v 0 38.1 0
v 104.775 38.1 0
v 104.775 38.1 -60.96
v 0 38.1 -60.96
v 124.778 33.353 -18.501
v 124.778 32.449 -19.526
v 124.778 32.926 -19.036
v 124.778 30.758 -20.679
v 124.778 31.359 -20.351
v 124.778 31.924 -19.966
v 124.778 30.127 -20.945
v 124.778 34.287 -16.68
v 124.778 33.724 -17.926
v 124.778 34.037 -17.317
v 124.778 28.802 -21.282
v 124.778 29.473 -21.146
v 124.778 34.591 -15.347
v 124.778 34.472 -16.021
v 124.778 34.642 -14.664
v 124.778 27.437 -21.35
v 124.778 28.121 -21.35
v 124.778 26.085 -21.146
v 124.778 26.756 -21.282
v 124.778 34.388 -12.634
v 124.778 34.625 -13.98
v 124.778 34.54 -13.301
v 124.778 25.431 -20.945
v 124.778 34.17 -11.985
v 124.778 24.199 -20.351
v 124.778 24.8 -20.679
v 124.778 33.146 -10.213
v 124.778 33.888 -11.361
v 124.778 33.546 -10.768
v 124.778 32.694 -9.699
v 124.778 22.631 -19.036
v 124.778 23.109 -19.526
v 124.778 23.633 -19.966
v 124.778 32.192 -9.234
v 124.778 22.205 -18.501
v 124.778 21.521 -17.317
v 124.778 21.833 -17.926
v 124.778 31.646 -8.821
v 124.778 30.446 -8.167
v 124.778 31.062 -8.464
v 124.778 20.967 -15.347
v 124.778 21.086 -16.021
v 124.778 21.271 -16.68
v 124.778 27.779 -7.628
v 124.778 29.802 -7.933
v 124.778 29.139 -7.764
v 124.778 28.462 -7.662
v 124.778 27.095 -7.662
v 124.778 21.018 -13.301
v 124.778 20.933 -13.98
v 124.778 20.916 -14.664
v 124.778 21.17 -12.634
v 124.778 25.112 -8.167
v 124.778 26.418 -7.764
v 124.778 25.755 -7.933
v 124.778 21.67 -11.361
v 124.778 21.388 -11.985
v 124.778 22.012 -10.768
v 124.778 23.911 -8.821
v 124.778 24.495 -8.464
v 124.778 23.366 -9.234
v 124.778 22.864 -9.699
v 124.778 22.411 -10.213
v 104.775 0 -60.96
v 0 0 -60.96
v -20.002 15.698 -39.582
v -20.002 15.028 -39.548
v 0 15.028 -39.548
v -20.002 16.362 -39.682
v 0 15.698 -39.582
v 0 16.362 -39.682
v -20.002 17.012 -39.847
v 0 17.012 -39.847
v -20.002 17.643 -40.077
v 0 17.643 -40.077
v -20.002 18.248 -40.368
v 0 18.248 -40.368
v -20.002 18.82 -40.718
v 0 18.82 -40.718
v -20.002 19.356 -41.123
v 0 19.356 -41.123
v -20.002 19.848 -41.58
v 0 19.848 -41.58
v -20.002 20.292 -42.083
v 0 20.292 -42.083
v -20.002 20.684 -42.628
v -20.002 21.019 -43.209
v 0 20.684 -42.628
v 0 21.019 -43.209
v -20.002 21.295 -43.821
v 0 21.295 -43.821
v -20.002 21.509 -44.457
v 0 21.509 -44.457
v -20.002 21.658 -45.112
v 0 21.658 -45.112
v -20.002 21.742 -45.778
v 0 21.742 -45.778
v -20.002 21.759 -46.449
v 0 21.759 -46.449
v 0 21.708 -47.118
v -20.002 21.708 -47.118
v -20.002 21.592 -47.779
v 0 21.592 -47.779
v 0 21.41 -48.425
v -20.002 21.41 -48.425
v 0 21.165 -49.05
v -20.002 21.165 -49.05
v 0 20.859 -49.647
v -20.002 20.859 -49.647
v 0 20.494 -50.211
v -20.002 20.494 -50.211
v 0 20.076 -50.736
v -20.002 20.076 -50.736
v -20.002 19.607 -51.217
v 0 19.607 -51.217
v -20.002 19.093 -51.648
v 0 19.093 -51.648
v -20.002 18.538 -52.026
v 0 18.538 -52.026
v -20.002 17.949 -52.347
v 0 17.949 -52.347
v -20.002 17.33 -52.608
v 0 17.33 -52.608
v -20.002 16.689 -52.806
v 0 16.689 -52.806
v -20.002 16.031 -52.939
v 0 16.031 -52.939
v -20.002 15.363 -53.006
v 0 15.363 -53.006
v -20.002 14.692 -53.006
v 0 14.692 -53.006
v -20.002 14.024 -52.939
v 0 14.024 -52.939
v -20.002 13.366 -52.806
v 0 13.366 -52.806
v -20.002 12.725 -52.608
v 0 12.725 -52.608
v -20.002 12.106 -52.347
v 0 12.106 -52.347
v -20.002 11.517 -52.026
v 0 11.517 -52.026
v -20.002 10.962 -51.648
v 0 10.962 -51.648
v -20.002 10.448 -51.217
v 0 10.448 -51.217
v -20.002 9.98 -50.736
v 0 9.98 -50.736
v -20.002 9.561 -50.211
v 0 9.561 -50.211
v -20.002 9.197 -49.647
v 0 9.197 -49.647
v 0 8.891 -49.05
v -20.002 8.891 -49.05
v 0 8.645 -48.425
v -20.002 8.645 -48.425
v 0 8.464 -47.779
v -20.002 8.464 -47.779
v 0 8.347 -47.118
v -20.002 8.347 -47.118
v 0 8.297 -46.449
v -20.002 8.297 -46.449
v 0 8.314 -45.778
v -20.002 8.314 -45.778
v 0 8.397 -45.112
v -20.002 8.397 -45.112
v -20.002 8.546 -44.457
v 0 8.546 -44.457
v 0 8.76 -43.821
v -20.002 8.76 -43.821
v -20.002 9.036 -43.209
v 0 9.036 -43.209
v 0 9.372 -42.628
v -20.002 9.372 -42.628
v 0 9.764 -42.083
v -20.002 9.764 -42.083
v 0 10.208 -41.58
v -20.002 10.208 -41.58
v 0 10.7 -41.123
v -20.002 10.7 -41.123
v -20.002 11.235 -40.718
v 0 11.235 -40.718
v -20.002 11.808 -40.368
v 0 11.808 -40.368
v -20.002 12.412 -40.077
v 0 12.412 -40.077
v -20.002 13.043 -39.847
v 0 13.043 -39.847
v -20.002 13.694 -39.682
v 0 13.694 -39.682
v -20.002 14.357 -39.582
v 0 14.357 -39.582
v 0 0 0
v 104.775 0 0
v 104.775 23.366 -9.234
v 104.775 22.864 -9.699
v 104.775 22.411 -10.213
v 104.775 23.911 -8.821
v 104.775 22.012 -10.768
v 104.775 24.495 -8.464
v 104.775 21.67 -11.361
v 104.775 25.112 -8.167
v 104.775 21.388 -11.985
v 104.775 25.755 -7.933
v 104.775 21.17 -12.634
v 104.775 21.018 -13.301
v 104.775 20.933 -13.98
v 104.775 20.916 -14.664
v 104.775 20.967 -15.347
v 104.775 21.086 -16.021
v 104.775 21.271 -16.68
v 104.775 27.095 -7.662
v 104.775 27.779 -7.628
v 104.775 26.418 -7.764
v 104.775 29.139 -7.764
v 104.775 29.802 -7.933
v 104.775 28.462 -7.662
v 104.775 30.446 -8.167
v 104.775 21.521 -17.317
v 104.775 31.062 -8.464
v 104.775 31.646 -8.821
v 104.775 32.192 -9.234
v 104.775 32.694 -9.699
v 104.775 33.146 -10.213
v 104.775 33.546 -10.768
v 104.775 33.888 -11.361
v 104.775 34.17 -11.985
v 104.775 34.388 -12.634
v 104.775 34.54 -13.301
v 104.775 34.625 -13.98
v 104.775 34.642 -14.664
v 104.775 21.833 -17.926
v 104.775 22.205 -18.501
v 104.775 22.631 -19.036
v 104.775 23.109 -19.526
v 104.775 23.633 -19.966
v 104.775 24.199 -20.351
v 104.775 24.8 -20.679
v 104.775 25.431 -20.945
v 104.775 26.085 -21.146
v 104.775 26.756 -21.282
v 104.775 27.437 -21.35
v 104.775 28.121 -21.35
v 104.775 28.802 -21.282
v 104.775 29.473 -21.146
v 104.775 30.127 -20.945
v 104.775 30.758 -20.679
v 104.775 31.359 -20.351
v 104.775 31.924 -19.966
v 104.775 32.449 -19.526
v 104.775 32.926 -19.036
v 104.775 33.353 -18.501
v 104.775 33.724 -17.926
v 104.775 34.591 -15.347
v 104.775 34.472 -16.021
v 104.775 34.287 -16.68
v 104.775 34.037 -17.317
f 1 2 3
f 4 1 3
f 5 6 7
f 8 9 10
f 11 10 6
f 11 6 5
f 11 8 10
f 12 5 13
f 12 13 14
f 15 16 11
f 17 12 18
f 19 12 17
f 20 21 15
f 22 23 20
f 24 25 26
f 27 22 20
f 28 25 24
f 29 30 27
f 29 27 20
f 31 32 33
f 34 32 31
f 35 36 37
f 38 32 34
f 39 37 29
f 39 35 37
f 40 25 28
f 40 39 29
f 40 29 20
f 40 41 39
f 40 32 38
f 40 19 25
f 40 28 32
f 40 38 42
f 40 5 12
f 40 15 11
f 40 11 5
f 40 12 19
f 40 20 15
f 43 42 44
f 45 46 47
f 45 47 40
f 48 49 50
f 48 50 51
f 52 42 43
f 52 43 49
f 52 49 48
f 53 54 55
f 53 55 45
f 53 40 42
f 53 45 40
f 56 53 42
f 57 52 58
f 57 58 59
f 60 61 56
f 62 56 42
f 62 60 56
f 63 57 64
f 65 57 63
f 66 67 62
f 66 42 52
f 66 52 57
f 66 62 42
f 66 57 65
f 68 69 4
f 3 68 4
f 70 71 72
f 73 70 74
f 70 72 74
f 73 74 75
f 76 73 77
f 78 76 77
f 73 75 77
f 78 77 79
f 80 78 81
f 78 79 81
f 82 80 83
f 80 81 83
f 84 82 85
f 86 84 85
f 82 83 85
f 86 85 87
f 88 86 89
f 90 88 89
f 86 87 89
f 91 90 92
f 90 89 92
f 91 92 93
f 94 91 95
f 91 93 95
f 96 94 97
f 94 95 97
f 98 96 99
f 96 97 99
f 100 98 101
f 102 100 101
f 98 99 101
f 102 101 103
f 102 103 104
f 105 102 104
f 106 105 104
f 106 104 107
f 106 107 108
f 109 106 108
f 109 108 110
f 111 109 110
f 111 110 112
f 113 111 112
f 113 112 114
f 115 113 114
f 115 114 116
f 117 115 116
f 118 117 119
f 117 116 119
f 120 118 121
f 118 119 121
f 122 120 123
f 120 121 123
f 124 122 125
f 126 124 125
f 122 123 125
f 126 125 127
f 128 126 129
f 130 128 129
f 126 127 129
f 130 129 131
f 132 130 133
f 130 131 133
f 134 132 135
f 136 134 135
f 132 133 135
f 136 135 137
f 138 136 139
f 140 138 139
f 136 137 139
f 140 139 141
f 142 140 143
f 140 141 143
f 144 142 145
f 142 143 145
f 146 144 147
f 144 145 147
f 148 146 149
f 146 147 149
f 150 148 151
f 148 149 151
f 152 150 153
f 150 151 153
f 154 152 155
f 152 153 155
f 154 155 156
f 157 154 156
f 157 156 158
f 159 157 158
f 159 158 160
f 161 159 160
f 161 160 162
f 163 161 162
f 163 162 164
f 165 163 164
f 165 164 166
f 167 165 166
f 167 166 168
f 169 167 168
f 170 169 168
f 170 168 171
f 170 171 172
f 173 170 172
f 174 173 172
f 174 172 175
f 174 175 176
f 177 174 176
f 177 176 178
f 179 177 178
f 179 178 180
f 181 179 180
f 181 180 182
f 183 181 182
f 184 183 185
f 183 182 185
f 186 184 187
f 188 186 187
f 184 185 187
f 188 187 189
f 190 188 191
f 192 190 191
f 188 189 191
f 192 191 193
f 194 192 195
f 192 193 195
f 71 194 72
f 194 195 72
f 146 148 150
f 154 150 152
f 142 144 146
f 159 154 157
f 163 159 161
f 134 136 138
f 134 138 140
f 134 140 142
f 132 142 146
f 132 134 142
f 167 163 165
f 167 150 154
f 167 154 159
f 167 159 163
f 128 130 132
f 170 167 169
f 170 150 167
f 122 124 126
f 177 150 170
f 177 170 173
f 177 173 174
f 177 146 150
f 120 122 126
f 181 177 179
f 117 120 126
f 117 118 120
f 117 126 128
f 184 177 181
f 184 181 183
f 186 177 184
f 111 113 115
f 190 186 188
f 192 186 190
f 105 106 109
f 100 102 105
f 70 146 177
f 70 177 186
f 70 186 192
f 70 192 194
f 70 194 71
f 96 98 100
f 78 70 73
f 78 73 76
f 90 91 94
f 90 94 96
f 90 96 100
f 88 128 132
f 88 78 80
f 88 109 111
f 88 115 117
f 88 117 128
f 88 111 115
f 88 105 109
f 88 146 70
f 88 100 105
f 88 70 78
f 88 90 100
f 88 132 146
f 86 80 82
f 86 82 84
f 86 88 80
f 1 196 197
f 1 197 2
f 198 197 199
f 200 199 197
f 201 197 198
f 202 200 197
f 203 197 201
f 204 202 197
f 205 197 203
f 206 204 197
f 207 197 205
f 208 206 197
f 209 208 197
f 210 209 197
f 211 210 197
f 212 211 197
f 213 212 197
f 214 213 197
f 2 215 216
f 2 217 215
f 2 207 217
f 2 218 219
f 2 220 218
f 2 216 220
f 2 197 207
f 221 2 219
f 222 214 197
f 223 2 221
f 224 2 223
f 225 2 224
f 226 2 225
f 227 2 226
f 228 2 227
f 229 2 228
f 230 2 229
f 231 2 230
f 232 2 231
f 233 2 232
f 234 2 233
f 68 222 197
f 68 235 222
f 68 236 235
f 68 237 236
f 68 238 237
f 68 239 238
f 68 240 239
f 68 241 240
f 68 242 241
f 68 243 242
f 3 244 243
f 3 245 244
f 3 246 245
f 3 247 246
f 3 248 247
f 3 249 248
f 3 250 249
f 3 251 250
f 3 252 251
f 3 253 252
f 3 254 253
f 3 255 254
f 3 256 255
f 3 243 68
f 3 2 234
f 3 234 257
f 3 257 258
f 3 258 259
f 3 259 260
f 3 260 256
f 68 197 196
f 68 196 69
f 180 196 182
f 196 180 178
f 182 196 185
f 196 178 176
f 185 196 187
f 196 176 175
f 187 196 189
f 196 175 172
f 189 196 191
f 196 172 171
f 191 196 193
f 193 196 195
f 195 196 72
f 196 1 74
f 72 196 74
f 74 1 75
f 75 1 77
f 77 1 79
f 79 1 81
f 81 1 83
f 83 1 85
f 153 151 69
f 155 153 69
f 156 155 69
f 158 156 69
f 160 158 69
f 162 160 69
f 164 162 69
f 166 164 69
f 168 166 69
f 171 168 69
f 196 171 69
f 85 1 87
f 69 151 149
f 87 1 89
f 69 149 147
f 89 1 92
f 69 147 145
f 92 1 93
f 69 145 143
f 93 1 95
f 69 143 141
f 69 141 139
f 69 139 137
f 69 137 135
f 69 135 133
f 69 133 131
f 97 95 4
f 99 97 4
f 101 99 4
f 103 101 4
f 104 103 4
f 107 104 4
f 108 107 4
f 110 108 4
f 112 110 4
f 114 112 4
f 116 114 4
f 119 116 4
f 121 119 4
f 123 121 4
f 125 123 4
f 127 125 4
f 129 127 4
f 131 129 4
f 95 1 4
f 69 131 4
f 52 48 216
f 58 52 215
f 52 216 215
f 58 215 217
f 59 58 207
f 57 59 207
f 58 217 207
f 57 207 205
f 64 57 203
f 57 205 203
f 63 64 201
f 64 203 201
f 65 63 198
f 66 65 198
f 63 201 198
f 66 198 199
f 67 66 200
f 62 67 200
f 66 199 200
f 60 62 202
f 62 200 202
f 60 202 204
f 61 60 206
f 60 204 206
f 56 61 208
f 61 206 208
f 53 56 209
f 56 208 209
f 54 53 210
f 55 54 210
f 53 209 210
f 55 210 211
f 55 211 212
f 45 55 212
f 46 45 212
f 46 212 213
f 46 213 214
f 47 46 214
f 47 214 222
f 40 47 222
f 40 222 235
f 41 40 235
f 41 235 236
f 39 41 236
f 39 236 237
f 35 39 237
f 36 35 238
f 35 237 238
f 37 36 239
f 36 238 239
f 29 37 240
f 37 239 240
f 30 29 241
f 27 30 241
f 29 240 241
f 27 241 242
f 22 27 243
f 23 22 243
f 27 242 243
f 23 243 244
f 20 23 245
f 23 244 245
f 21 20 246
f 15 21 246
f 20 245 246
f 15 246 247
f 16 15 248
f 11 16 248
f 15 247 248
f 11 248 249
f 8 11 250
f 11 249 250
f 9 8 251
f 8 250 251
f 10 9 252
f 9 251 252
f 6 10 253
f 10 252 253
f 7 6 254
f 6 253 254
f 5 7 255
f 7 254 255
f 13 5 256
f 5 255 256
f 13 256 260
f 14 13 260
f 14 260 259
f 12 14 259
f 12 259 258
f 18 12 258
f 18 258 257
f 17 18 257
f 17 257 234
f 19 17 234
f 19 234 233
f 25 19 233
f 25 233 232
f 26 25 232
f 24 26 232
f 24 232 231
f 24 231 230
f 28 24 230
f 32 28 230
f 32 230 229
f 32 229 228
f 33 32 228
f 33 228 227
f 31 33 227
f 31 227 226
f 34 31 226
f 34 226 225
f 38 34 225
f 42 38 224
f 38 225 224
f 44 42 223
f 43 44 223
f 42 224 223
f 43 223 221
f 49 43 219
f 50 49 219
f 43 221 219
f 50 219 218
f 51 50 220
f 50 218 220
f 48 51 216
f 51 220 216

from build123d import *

# Parameters (mm, degrees)
SKETCH1_W           = 60.96
SKETCH1_H           = 38.1
BOSS_EXTRUDE1_DEPTH = 104.775
SKETCH3_R           = 6.732897925
BOSS_EXTRUDE2_DEPTH = 20.0025
SKETCH2_R           = 6.865425502
BOSS_EXTRUDE3_DEPTH = 20.0025


with BuildPart() as part:
    # Sketch1 → Boss-Extrude1 (new body)
    with BuildSketch(Plane(origin=(0, 0, 0), x_dir=(0, 0, -1), z_dir=(1, 0, 0))):
        with Locations((30.48, 19.05)):
            Rectangle(SKETCH1_W, SKETCH1_H)
    extrude(amount=BOSS_EXTRUDE1_DEPTH)

    # Sketch3 → Boss-Extrude2 (add)
    with BuildSketch(Plane.ZY):
        with Locations((-46.280983346, 15.027703104)):
            Circle(SKETCH3_R)
    extrude(amount=BOSS_EXTRUDE2_DEPTH)

    # Sketch2 → Boss-Extrude3 (add)
    with BuildSketch(Plane(origin=(104.775, 0, 0), x_dir=(0, 0, -1), z_dir=(1, 0, 0))):
        with Locations(Location((14.493127779, 27.778848981, 0), (0, 0, 180))):
            Circle(SKETCH2_R)
    extrude(amount=BOSS_EXTRUDE3_DEPTH)


solid = part.part
